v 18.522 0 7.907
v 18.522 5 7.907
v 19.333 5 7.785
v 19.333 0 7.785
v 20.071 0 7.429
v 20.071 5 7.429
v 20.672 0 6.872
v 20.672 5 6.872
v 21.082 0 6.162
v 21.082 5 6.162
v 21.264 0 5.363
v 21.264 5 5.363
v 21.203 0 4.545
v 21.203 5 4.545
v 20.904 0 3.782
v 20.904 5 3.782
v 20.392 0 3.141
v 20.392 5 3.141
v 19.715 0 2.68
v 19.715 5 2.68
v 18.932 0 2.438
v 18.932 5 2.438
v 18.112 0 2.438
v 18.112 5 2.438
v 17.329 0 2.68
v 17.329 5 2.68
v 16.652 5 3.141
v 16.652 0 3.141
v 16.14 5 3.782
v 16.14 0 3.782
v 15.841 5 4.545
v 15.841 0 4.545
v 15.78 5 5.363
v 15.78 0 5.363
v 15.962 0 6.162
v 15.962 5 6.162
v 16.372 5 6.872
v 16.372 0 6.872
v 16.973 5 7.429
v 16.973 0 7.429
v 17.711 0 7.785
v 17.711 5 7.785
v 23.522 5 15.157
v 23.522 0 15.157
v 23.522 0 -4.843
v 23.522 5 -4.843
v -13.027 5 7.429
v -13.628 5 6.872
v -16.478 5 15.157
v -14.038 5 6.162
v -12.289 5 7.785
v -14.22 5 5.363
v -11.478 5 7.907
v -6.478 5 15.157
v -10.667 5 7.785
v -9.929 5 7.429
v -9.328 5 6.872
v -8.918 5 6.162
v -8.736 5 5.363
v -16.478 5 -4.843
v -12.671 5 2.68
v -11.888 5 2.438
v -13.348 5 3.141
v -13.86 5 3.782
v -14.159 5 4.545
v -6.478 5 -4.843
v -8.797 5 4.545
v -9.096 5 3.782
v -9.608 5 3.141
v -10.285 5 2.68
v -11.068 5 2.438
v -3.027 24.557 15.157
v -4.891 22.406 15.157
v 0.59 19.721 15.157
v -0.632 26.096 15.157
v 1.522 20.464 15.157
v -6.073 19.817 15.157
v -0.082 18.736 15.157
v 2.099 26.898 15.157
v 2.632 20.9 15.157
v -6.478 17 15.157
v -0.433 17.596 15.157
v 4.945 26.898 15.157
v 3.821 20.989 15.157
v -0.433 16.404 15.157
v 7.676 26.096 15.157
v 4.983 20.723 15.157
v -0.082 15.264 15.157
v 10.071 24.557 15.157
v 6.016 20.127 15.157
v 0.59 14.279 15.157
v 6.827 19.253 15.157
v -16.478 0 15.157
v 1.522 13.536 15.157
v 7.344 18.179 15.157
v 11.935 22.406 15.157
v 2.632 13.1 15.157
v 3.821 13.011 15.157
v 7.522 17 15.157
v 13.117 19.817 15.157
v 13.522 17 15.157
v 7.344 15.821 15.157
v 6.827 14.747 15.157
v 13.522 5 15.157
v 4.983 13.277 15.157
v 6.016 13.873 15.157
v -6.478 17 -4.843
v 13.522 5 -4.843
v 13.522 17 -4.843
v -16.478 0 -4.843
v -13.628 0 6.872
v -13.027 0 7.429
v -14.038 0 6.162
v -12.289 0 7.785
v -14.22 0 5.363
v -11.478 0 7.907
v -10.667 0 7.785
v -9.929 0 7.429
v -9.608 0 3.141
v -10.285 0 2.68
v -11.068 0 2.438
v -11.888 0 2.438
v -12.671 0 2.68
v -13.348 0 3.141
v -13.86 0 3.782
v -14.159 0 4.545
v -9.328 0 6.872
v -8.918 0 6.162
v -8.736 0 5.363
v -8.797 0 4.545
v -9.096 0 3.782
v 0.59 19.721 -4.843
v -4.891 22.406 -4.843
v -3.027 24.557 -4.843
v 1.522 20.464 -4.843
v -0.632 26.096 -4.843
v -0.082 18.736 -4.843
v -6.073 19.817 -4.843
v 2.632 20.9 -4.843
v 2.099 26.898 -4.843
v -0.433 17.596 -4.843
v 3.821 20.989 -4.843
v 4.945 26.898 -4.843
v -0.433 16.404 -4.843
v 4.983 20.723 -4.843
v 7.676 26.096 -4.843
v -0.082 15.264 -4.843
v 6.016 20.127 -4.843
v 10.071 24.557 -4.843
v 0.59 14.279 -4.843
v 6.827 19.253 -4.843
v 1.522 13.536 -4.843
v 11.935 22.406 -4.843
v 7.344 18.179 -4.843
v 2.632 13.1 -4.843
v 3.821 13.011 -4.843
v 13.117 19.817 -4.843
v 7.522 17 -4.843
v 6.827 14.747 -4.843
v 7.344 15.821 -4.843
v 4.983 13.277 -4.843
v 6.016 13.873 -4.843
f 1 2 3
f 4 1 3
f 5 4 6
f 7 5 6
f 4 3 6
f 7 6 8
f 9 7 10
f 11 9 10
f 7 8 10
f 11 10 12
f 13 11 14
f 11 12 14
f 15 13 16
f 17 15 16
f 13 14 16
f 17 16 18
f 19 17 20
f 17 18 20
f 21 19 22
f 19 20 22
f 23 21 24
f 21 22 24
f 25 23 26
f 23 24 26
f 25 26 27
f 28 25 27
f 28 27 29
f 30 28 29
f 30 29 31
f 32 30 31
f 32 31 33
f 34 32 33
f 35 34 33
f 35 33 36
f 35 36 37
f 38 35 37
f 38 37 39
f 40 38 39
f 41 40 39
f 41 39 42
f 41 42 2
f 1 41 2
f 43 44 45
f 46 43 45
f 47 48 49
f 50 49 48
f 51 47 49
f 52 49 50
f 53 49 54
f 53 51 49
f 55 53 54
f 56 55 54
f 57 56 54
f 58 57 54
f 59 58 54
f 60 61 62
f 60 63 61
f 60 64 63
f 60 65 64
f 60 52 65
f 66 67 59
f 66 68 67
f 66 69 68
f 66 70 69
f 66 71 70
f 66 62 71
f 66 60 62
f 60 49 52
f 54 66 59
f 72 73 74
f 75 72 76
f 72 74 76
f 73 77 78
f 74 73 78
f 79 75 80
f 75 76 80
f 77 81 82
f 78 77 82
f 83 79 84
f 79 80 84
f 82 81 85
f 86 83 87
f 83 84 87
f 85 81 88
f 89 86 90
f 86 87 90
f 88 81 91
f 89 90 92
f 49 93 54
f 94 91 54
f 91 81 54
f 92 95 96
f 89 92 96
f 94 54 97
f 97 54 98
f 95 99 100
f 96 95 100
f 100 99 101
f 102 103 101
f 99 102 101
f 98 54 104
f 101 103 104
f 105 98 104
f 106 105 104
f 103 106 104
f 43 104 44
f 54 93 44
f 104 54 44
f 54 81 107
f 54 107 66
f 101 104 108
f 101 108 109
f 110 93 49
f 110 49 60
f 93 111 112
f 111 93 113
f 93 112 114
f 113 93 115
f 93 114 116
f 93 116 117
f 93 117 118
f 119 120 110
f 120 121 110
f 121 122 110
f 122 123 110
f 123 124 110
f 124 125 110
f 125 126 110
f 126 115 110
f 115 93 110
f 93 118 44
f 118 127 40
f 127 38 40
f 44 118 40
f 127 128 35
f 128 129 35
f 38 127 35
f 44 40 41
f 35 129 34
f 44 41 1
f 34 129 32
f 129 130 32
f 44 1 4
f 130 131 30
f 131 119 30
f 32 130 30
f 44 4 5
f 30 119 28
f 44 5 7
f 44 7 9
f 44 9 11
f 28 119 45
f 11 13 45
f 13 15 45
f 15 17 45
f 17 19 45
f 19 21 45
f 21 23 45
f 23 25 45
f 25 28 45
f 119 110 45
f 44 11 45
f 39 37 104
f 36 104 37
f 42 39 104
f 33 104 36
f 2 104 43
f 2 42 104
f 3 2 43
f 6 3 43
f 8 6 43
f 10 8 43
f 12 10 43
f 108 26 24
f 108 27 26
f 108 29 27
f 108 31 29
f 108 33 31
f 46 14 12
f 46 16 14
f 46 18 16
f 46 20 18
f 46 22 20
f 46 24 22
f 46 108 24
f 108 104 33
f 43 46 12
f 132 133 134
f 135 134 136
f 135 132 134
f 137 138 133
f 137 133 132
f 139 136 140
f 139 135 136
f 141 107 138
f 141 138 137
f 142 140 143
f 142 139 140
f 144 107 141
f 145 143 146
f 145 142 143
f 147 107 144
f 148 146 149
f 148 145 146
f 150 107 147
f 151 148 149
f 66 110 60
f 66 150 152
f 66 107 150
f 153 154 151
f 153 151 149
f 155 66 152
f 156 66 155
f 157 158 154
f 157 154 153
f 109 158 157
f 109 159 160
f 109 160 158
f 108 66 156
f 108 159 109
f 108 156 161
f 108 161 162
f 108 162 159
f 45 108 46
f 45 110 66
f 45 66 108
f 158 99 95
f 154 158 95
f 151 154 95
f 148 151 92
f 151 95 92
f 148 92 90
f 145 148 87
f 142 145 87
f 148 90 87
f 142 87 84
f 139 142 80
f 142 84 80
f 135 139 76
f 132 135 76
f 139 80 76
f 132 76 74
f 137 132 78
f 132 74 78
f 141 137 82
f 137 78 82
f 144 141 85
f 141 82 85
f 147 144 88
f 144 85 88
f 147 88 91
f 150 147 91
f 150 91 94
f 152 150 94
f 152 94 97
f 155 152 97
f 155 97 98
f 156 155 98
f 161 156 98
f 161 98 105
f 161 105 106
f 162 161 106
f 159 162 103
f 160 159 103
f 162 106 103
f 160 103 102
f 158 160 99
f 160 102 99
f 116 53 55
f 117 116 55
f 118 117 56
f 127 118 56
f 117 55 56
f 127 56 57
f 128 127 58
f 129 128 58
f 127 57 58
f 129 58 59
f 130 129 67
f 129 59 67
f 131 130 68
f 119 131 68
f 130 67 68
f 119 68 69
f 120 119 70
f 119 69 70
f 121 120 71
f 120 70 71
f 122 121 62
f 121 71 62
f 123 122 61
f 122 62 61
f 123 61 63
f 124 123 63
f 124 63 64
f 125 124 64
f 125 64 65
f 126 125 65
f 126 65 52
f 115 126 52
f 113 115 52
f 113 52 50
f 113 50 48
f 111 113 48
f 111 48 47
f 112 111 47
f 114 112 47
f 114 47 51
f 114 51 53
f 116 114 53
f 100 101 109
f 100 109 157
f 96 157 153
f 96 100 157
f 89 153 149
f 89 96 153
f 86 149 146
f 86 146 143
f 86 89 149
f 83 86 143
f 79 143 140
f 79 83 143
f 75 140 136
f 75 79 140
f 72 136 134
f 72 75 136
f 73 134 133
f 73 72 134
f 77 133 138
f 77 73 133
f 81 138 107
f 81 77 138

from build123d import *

# Parameters (mm, degrees)
SKETCH_1_W          = 40
SKETCH_1_H          = 20
EXTRUDE_1_DEPTH     = 5
SKETCH_2_R          = 4
EXTRUDE_2_DEPTH     = 20
SKETCH_3_R          = 2.75
CUT_EXTRUDE_1_DEPTH = 36.595319622


with BuildPart() as part:
    # 草图1 → 凸台-拉伸1 (new body)
    with BuildSketch(Plane(origin=(0, 0, 0), x_dir=(1, 0, 0), z_dir=(0, 1, 0))):
        with Locations((3.522012579, -5.157232704)):
            Rectangle(SKETCH_1_W, SKETCH_1_H)
    extrude(amount=EXTRUDE_1_DEPTH)

    # 草图2 → 凸台-拉伸2 (add)
    with BuildSketch(Plane.XY.offset(15.157232704)):
        with BuildLine():
            Line((-6.477987421, 17), (-6.477987421, 5))
            Line((-6.477987421, 5), (13.522012579, 5))
            Line((13.522012579, 5), (13.522012579, 17))
            ThreePointArc((13.522012579, 17), (3.522012579, 27), (-6.477987421, 17))
        make_face()
        with Locations((3.522012579, 17)):
            Circle(SKETCH_2_R, mode=Mode.SUBTRACT)
    extrude(amount=-EXTRUDE_2_DEPTH)

    # 草图3 → 切除-拉伸1 (cut, through all)
    with BuildSketch(Plane(origin=(0, 5, 0), x_dir=(1, 0, 0), z_dir=(0, 1, 0))):
        with Locations(Location((-11.477987421, -5.157232704, 0), (0, 0, 270))):
            Circle(SKETCH_3_R)
        with Locations(Location((18.522012579, -5.157232704, 0), (0, 0, 270))):
            Circle(SKETCH_3_R)
    extrude(amount=-CUT_EXTRUDE_1_DEPTH, mode=Mode.SUBTRACT)


solid = part.part
